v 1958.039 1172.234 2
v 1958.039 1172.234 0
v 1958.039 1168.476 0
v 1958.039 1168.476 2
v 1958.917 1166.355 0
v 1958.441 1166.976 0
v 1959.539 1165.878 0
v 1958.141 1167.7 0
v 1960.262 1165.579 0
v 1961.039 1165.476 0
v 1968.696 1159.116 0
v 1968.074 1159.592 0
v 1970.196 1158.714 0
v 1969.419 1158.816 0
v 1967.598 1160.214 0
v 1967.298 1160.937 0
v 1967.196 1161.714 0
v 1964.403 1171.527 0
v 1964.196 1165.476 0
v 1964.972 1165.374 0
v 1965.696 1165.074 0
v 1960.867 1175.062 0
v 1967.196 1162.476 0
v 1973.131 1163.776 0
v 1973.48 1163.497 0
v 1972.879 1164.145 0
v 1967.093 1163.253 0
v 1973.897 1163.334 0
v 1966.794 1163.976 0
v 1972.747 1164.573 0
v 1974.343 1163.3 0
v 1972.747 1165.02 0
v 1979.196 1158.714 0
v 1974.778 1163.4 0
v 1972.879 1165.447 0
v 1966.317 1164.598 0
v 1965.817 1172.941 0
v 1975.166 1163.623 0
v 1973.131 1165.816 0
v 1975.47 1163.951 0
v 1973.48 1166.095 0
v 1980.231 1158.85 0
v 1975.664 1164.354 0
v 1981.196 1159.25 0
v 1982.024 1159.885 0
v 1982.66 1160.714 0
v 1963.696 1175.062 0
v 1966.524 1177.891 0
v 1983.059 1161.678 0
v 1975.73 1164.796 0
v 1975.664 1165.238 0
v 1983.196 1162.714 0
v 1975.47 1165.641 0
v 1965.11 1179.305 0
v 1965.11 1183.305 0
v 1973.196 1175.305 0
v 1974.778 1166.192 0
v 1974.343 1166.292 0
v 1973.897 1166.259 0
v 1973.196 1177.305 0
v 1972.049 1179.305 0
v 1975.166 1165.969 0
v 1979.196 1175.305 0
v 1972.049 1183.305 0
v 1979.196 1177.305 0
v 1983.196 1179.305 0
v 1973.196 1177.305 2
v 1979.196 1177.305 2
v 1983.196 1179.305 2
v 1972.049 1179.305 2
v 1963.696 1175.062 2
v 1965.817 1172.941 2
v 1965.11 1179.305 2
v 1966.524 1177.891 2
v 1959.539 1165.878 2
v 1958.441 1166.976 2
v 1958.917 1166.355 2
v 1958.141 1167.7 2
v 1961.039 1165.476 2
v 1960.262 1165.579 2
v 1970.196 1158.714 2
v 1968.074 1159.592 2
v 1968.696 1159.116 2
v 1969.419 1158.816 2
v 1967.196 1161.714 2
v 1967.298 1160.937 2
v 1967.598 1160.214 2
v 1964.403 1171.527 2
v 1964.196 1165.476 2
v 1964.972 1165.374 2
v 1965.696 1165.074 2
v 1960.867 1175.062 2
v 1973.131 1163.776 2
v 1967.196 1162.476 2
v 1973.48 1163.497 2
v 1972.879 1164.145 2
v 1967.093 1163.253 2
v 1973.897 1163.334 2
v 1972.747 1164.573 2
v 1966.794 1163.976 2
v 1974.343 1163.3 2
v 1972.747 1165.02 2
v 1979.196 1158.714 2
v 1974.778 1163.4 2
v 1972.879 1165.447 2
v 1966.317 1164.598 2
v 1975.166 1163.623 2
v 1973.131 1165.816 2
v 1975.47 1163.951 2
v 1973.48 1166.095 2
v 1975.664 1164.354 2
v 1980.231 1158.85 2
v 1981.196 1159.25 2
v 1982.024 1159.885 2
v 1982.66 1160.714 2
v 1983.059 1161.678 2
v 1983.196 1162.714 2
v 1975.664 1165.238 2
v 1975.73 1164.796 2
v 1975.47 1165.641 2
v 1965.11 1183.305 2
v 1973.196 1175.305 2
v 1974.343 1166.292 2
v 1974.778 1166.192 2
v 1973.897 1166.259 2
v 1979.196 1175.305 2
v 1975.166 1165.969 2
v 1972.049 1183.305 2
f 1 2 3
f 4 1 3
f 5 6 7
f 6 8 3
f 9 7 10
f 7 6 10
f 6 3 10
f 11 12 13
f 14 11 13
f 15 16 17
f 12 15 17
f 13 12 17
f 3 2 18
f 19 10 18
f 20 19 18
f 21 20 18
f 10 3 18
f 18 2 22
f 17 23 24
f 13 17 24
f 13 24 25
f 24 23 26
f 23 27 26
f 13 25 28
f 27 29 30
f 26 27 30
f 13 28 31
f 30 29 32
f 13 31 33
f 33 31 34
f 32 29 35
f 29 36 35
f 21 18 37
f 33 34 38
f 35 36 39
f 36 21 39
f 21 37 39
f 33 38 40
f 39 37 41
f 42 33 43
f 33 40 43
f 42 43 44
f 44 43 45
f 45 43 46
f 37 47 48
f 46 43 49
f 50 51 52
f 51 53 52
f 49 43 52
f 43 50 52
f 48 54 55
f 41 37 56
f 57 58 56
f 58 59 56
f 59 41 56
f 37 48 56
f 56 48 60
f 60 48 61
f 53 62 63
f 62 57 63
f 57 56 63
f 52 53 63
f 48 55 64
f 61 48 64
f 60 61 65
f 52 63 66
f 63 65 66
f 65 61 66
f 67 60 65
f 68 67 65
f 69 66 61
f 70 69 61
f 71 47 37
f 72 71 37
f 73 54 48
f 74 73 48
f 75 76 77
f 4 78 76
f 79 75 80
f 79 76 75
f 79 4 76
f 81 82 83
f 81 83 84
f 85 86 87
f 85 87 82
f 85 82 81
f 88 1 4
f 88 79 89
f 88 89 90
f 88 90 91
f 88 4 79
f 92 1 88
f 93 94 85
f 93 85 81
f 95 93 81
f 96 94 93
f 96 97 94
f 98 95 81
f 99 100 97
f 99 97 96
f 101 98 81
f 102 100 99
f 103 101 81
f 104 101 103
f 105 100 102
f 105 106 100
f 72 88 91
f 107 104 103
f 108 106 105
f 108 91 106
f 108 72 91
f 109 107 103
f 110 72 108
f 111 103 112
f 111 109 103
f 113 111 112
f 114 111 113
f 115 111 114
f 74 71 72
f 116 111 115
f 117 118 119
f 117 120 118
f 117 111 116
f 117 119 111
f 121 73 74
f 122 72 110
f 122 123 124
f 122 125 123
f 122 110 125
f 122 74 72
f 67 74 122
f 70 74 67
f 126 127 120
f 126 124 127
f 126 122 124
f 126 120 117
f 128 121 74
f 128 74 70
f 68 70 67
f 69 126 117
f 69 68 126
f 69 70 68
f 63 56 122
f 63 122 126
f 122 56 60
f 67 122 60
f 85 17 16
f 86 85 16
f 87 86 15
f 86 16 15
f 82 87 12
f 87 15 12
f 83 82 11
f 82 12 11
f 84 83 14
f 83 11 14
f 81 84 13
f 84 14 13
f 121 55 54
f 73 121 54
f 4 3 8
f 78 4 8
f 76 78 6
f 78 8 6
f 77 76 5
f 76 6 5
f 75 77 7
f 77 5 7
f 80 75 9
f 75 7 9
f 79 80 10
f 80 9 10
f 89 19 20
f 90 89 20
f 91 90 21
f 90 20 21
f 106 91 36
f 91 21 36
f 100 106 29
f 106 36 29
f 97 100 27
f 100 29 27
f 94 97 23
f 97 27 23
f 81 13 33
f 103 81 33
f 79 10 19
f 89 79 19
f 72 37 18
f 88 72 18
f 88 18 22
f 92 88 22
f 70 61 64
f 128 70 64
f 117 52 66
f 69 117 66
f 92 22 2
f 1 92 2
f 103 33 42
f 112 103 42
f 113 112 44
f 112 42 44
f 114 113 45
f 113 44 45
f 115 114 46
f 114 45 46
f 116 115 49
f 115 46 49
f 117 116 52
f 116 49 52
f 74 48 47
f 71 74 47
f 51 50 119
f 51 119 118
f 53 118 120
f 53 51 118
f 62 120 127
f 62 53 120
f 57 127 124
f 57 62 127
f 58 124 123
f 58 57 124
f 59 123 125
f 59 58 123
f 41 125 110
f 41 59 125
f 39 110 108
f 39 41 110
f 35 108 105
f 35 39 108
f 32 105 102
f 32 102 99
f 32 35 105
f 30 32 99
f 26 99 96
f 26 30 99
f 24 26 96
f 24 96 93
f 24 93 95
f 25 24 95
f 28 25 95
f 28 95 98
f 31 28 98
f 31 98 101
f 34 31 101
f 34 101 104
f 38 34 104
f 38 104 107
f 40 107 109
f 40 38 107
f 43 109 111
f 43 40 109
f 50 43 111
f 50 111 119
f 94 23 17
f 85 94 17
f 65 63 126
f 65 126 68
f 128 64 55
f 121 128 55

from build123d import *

# Parameters (mm, degrees)
MODEL_R             = 1.5
MODEL_W             = 6
MODEL_H             = 2
BOSS_EXTRUDE1_DEPTH = 2


with BuildPart() as part:
    # Model → Boss-Extrude1 (new body)
    with BuildSketch(Plane.XY):
        with BuildLine():
            Line((1964.402734505, 1171.526635788), (1960.867200599, 1175.062169694))
            Line((1960.867200599, 1175.062169694), (1958.038773475, 1172.23374257))
            Line((1958.038773475, 1172.23374257), (1958.038773475, 1168.476383257))
            ThreePointArc((1958.038773475, 1168.476383257), (1958.917453131, 1166.355062913), (1961.038773475, 1165.476383257))
            Line((1961.038773475, 1165.476383257), (1963.867200599, 1165.476383257))
            Line((1963.867200599, 1165.476383257), (1964.195627724, 1165.476383257))
            ThreePointArc((1964.195627724, 1165.476383257), (1966.316948068, 1164.5977036), (1967.195627724, 1162.476383257))
            Line((1967.195627724, 1162.476383257), (1967.195627724, 1161.713700328))
            ThreePointArc((1967.195627724, 1161.713700328), (1968.074307381, 1159.592379984), (1970.195627724, 1158.713700328))
            Line((1970.195627724, 1158.713700328), (1979.195627724, 1158.713700328))
            ThreePointArc((1979.195627724, 1158.713700328), (1982.024054849, 1159.885273203), (1983.195627724, 1162.713700328))
            Line((1983.195627724, 1162.713700328), (1983.195627724, 1179.304810381))
            Line((1983.195627724, 1179.304810381), (1972.049181115, 1179.304810381))
            Line((1972.049181115, 1179.304810381), (1972.049181115, 1183.304810381))
            Line((1972.049181115, 1183.304810381), (1965.109841287, 1183.304810381))
            Line((1965.109841287, 1183.304810381), (1965.109841287, 1179.304810381))
            Line((1965.109841287, 1179.304810381), (1966.524054849, 1177.890596819))
            Line((1966.524054849, 1177.890596819), (1963.695627724, 1175.062169694))
            Line((1963.695627724, 1175.062169694), (1965.816948068, 1172.940849351))
            Line((1965.816948068, 1172.940849351), (1964.402734505, 1171.526635788))
        make_face()
        with Locations((1974.230460889, 1164.796116562)):
            Circle(MODEL_R, mode=Mode.SUBTRACT)
        with Locations((1976.195627724, 1176.304810381)):
            Rectangle(MODEL_W, MODEL_H, mode=Mode.SUBTRACT)
    extrude(amount=BOSS_EXTRUDE1_DEPTH)


solid = part.part
